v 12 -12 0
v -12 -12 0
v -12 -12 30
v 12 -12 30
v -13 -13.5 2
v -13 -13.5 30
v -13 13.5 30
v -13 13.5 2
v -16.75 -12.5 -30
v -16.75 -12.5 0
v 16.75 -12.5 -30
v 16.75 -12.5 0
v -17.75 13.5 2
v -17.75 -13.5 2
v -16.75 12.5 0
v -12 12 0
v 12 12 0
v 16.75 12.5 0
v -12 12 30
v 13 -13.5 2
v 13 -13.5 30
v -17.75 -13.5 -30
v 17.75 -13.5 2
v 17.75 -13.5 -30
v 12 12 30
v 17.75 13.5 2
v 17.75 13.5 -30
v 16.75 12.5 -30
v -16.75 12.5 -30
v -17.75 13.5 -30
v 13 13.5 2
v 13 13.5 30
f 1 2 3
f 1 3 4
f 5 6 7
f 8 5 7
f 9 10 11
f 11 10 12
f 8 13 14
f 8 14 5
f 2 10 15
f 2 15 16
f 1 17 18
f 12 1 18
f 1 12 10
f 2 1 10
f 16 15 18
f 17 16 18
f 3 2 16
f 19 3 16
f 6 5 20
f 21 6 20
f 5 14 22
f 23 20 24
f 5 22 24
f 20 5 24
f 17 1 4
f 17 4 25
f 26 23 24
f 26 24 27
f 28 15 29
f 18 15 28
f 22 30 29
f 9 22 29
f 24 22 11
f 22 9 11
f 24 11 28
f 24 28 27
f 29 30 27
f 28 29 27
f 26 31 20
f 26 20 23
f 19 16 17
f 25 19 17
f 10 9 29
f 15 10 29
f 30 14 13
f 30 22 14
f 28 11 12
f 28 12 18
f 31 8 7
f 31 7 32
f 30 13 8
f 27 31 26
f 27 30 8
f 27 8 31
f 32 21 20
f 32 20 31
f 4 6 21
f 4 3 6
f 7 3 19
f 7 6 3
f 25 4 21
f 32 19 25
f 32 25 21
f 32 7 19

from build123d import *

# Parameters (mm, degrees)
SKETCH_W      = 26
SKETCH_H      = 27
SKETCH_W_2    = 24
SKETCH_H_2    = 24
PAD_DEPTH     = 30
SKETCH001_W   = 35.5
SKETCH001_H   = 27
SKETCH001_W_2 = 33.5
SKETCH001_H_2 = 25
PAD001_DEPTH  = 30
SKETCH002_W   = 35.5
SKETCH002_H   = 27
SKETCH002_W_2 = 24
SKETCH002_H_2 = 24
PAD002_DEPTH  = 2


with BuildPart() as part:
    # Sketch → Pad (new body)
    with BuildSketch(Plane.XY):
        Rectangle(SKETCH_W, SKETCH_H)
        Rectangle(SKETCH_W_2, SKETCH_H_2, mode=Mode.SUBTRACT)
    extrude(amount=PAD_DEPTH)

    # Sketch001 → Pad001 (join)
    with BuildSketch(Plane.XY):
        Rectangle(SKETCH001_W, SKETCH001_H)
        Rectangle(SKETCH001_W_2, SKETCH001_H_2, mode=Mode.SUBTRACT)
    extrude(amount=-PAD001_DEPTH)

    # Sketch002 → Pad002 (join)
    with BuildSketch(Plane.XY):
        Rectangle(SKETCH002_W, SKETCH002_H)
        Rectangle(SKETCH002_W_2, SKETCH002_H_2, mode=Mode.SUBTRACT)
    extrude(amount=PAD002_DEPTH)


solid = part.part
